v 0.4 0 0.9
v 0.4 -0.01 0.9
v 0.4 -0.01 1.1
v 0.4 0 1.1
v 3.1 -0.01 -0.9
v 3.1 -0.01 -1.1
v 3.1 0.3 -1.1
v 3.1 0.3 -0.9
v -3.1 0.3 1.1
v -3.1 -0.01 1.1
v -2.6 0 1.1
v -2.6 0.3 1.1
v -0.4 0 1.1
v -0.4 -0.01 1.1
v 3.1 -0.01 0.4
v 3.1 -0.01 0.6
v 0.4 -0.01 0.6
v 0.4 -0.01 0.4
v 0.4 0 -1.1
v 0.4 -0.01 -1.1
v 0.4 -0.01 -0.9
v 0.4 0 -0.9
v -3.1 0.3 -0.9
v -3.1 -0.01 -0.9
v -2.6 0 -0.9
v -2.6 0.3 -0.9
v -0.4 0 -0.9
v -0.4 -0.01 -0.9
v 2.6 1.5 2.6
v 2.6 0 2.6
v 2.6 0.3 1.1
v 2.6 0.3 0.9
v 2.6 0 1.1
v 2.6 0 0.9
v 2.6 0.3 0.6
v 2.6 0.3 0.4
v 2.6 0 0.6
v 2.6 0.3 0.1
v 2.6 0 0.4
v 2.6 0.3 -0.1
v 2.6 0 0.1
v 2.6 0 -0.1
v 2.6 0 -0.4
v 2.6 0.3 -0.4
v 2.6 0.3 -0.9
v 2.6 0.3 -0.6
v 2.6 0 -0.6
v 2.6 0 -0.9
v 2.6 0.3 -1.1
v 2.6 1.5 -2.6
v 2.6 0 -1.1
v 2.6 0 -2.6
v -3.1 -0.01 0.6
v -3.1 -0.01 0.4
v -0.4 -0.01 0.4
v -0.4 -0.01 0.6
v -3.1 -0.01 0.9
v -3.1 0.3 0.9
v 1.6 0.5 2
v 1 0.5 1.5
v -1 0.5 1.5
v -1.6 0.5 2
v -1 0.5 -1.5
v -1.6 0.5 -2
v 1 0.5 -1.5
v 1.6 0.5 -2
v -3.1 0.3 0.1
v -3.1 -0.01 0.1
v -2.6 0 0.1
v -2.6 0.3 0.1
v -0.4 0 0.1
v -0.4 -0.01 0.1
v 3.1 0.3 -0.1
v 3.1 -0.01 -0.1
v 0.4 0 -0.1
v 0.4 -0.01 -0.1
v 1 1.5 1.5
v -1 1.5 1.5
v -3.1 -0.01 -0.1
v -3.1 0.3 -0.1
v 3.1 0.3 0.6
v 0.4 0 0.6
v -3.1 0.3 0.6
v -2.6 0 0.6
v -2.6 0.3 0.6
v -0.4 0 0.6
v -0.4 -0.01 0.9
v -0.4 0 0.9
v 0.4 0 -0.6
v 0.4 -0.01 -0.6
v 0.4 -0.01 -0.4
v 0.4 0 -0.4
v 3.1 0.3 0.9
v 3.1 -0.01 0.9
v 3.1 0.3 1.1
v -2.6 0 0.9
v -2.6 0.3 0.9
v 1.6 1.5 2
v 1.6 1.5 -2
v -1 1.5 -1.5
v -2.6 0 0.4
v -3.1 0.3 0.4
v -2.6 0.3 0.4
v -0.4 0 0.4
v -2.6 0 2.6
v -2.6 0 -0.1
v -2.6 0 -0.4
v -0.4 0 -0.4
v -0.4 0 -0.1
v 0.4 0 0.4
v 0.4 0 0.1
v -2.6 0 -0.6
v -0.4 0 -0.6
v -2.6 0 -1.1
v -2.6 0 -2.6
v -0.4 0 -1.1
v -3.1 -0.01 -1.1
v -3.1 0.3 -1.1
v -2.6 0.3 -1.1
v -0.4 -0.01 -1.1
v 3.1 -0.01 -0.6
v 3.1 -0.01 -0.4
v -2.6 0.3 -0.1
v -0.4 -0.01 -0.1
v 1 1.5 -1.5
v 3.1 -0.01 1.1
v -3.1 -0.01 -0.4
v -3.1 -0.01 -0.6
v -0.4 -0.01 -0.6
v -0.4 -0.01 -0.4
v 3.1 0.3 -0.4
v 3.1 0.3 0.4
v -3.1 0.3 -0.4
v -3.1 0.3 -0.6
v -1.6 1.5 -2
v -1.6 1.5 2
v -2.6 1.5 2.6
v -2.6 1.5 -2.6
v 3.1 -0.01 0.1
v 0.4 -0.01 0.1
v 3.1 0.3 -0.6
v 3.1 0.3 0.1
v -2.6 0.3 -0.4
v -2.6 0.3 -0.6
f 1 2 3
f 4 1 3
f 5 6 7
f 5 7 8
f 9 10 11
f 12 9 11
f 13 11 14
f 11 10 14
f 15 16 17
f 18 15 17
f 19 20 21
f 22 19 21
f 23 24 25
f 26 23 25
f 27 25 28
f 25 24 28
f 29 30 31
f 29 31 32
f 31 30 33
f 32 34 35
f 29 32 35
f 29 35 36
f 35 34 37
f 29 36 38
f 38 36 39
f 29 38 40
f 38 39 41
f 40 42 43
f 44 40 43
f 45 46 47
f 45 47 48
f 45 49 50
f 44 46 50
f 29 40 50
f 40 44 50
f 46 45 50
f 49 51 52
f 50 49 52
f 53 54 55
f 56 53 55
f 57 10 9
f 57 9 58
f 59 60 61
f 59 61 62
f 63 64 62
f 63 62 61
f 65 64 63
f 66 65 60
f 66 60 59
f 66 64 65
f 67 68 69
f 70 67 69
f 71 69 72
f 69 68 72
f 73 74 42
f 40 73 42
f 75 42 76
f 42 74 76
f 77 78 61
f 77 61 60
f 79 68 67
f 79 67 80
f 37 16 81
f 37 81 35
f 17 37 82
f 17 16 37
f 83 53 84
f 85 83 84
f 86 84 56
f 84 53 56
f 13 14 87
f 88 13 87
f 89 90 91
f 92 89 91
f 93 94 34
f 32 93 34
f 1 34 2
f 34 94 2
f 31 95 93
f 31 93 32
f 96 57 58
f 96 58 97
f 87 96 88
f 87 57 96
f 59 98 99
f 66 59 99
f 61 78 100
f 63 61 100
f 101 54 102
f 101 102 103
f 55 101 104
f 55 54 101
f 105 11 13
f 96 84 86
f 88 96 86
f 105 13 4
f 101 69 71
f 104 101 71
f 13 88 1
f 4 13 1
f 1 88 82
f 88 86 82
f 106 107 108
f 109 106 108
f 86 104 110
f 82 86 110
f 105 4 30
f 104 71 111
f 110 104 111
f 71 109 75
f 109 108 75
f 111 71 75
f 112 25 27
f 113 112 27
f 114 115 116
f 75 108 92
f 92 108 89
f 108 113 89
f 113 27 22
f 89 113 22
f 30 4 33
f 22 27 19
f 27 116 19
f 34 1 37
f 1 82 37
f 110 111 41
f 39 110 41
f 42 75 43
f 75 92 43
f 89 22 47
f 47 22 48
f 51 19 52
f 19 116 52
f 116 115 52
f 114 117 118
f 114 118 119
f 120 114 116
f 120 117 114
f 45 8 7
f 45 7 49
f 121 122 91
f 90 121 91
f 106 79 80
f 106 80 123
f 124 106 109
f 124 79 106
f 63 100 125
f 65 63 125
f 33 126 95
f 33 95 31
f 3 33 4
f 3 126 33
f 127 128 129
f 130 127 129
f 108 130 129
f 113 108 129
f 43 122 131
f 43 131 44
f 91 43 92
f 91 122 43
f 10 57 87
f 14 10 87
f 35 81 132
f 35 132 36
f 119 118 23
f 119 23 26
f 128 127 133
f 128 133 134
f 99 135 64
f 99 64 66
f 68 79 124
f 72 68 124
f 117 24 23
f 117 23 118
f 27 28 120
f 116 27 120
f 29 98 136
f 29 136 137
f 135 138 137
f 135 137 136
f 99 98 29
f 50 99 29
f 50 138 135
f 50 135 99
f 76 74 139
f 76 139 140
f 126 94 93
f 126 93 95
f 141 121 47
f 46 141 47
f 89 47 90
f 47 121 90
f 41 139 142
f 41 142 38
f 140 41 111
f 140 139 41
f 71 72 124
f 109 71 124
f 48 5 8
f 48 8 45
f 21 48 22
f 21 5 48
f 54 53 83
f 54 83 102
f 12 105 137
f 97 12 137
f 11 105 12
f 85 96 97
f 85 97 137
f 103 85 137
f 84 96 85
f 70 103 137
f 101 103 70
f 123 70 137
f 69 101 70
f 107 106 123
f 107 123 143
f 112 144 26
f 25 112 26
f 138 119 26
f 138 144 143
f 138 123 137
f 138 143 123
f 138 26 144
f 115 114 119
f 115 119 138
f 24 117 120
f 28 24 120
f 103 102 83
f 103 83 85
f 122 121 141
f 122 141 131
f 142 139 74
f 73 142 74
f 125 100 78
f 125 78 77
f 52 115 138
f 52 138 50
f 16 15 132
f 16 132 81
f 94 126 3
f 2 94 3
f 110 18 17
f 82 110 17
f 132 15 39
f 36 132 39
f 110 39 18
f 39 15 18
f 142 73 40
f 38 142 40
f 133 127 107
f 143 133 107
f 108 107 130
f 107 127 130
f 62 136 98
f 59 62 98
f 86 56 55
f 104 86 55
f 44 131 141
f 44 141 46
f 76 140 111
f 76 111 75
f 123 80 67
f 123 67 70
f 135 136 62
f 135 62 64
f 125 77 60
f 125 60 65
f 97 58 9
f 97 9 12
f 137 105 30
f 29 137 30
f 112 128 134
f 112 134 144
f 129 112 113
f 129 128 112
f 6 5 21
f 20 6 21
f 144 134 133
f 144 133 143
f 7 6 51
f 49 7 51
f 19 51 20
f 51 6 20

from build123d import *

# Parameters (mm, degrees)
SKETCH_1_W                 = 5.2
SKETCH_1_H                 = 5.2
EXTRUDE_1_DEPTH            = 1.5
SKETCH_2_W                 = 3.2
SKETCH_2_H                 = 4
SKETCH_2_W_2               = 2
SKETCH_2_H_2               = 3
CUT_EXTRUDE_1_DEPTH        = 1
EXTRUDE_START              = -0.01
SKETCH_3_W                 = 2.7
SKETCH_3_H                 = 0.2
EXTRUDE_2_DEPTH            = 0.31
PATTERN_LINEAR_1_COUNT     = 3
PATTERN_LINEAR_1_PITCH     = 0.5
PATTERN_LINEAR_1_COL_COUNT = 3
PATTERN_LINEAR_1_COL_PITCH = 0.5
MIRROR_START               = -0.01
MIRROR_1_COPY_1_SKETCH_W   = 2.7
MIRROR_1_COPY_1_SKETCH_H   = 0.2
MIRROR_1_COPY_1_DEPTH      = 0.31
MIRROR_1_COPY_2_SKETCH_W   = 2.7
MIRROR_1_COPY_2_SKETCH_H   = 0.2
MIRROR_1_COPY_2_DEPTH      = 0.31
MIRROR_1_COPY_3_SKETCH_W   = 2.7
MIRROR_1_COPY_3_SKETCH_H   = 0.2
MIRROR_1_COPY_3_DEPTH      = 0.31
MIRROR_1_COPY_4_SKETCH_W   = 2.7
MIRROR_1_COPY_4_SKETCH_H   = 0.2
MIRROR_1_COPY_4_DEPTH      = 0.31


with BuildPart() as part:
    # Эскиз1 → Бобышка-Вытянуть1 (new body)
    with BuildSketch(Plane(origin=(0, 0, 0), x_dir=(1, 0, 0), z_dir=(0, 1, 0))):
        Rectangle(SKETCH_1_W, SKETCH_1_H)
    extrude(amount=EXTRUDE_1_DEPTH)

    # Эскиз2 → Вырез-Вытянуть1 (cut)
    with BuildSketch(Plane(origin=(0, 1.5, 0), x_dir=(1, 0, 0), z_dir=(0, 1, 0))):
        Rectangle(SKETCH_2_W, SKETCH_2_H)
        Rectangle(SKETCH_2_W_2, SKETCH_2_H_2, mode=Mode.SUBTRACT)
    extrude(amount=-CUT_EXTRUDE_1_DEPTH, mode=Mode.SUBTRACT)

    # Эскиз3 → Бобышка-Вытянуть2 (add)
    with BuildSketch(Plane(origin=(0, 0, 0), x_dir=(1, 0, 0), z_dir=(0, 1, 0)).offset(EXTRUDE_START)):
        with Locations((-1.75, 0)):
            Rectangle(SKETCH_3_W, SKETCH_3_H)
    extrude_2 = extrude(amount=EXTRUDE_2_DEPTH)

    # Линейный массив1: Бобышка-Вытянуть2 ×3
    with Locations(*[(0, 0, -i * PATTERN_LINEAR_1_PITCH) for i in range(1, PATTERN_LINEAR_1_COUNT)]):
        add(extrude_2)

    # Линейный массив1 col: Бобышка-Вытянуть2 ×3
    with Locations(*[(0, 0, i * PATTERN_LINEAR_1_COL_PITCH) for i in range(1, PATTERN_LINEAR_1_COL_COUNT)]):
        add(extrude_2)

    # Зеркальное отражение1: Бобышка-Вытянуть2 across plane
    add(extrude_2.mirror(Plane(origin=(0, 0, 0), x_dir=(0, 0, 1), z_dir=(1, 0, 0))))

    # Зеркальное отражение1 copy 1 sketch → Зеркальное отражение1 copy 1 (add)
    with BuildSketch(Plane(origin=(0, 0, -0.5), x_dir=(-1, 0, 0), z_dir=(0, 1, 0)).offset(MIRROR_START)):
        with Locations((-1.75, 0)):
            Rectangle(MIRROR_1_COPY_1_SKETCH_W, MIRROR_1_COPY_1_SKETCH_H)
    extrude(amount=MIRROR_1_COPY_1_DEPTH)

    # Зеркальное отражение1 copy 2 sketch → Зеркальное отражение1 copy 2 (add)
    with BuildSketch(Plane(origin=(0, 0, -1), x_dir=(-1, 0, 0), z_dir=(0, 1, 0)).offset(MIRROR_START)):
        with Locations((-1.75, 0)):
            Rectangle(MIRROR_1_COPY_2_SKETCH_W, MIRROR_1_COPY_2_SKETCH_H)
    extrude(amount=MIRROR_1_COPY_2_DEPTH)

    # Зеркальное отражение1 copy 3 sketch → Зеркальное отражение1 copy 3 (add)
    with BuildSketch(Plane(origin=(0, 0, 0.5), x_dir=(-1, 0, 0), z_dir=(0, 1, 0)).offset(MIRROR_START)):
        with Locations((-1.75, 0)):
            Rectangle(MIRROR_1_COPY_3_SKETCH_W, MIRROR_1_COPY_3_SKETCH_H)
    extrude(amount=MIRROR_1_COPY_3_DEPTH)

    # Зеркальное отражение1 copy 4 sketch → Зеркальное отражение1 copy 4 (add)
    with BuildSketch(Plane(origin=(0, 0, 1), x_dir=(-1, 0, 0), z_dir=(0, 1, 0)).offset(MIRROR_START)):
        with Locations((-1.75, 0)):
            Rectangle(MIRROR_1_COPY_4_SKETCH_W, MIRROR_1_COPY_4_SKETCH_H)
    extrude(amount=MIRROR_1_COPY_4_DEPTH)


solid = part.part
